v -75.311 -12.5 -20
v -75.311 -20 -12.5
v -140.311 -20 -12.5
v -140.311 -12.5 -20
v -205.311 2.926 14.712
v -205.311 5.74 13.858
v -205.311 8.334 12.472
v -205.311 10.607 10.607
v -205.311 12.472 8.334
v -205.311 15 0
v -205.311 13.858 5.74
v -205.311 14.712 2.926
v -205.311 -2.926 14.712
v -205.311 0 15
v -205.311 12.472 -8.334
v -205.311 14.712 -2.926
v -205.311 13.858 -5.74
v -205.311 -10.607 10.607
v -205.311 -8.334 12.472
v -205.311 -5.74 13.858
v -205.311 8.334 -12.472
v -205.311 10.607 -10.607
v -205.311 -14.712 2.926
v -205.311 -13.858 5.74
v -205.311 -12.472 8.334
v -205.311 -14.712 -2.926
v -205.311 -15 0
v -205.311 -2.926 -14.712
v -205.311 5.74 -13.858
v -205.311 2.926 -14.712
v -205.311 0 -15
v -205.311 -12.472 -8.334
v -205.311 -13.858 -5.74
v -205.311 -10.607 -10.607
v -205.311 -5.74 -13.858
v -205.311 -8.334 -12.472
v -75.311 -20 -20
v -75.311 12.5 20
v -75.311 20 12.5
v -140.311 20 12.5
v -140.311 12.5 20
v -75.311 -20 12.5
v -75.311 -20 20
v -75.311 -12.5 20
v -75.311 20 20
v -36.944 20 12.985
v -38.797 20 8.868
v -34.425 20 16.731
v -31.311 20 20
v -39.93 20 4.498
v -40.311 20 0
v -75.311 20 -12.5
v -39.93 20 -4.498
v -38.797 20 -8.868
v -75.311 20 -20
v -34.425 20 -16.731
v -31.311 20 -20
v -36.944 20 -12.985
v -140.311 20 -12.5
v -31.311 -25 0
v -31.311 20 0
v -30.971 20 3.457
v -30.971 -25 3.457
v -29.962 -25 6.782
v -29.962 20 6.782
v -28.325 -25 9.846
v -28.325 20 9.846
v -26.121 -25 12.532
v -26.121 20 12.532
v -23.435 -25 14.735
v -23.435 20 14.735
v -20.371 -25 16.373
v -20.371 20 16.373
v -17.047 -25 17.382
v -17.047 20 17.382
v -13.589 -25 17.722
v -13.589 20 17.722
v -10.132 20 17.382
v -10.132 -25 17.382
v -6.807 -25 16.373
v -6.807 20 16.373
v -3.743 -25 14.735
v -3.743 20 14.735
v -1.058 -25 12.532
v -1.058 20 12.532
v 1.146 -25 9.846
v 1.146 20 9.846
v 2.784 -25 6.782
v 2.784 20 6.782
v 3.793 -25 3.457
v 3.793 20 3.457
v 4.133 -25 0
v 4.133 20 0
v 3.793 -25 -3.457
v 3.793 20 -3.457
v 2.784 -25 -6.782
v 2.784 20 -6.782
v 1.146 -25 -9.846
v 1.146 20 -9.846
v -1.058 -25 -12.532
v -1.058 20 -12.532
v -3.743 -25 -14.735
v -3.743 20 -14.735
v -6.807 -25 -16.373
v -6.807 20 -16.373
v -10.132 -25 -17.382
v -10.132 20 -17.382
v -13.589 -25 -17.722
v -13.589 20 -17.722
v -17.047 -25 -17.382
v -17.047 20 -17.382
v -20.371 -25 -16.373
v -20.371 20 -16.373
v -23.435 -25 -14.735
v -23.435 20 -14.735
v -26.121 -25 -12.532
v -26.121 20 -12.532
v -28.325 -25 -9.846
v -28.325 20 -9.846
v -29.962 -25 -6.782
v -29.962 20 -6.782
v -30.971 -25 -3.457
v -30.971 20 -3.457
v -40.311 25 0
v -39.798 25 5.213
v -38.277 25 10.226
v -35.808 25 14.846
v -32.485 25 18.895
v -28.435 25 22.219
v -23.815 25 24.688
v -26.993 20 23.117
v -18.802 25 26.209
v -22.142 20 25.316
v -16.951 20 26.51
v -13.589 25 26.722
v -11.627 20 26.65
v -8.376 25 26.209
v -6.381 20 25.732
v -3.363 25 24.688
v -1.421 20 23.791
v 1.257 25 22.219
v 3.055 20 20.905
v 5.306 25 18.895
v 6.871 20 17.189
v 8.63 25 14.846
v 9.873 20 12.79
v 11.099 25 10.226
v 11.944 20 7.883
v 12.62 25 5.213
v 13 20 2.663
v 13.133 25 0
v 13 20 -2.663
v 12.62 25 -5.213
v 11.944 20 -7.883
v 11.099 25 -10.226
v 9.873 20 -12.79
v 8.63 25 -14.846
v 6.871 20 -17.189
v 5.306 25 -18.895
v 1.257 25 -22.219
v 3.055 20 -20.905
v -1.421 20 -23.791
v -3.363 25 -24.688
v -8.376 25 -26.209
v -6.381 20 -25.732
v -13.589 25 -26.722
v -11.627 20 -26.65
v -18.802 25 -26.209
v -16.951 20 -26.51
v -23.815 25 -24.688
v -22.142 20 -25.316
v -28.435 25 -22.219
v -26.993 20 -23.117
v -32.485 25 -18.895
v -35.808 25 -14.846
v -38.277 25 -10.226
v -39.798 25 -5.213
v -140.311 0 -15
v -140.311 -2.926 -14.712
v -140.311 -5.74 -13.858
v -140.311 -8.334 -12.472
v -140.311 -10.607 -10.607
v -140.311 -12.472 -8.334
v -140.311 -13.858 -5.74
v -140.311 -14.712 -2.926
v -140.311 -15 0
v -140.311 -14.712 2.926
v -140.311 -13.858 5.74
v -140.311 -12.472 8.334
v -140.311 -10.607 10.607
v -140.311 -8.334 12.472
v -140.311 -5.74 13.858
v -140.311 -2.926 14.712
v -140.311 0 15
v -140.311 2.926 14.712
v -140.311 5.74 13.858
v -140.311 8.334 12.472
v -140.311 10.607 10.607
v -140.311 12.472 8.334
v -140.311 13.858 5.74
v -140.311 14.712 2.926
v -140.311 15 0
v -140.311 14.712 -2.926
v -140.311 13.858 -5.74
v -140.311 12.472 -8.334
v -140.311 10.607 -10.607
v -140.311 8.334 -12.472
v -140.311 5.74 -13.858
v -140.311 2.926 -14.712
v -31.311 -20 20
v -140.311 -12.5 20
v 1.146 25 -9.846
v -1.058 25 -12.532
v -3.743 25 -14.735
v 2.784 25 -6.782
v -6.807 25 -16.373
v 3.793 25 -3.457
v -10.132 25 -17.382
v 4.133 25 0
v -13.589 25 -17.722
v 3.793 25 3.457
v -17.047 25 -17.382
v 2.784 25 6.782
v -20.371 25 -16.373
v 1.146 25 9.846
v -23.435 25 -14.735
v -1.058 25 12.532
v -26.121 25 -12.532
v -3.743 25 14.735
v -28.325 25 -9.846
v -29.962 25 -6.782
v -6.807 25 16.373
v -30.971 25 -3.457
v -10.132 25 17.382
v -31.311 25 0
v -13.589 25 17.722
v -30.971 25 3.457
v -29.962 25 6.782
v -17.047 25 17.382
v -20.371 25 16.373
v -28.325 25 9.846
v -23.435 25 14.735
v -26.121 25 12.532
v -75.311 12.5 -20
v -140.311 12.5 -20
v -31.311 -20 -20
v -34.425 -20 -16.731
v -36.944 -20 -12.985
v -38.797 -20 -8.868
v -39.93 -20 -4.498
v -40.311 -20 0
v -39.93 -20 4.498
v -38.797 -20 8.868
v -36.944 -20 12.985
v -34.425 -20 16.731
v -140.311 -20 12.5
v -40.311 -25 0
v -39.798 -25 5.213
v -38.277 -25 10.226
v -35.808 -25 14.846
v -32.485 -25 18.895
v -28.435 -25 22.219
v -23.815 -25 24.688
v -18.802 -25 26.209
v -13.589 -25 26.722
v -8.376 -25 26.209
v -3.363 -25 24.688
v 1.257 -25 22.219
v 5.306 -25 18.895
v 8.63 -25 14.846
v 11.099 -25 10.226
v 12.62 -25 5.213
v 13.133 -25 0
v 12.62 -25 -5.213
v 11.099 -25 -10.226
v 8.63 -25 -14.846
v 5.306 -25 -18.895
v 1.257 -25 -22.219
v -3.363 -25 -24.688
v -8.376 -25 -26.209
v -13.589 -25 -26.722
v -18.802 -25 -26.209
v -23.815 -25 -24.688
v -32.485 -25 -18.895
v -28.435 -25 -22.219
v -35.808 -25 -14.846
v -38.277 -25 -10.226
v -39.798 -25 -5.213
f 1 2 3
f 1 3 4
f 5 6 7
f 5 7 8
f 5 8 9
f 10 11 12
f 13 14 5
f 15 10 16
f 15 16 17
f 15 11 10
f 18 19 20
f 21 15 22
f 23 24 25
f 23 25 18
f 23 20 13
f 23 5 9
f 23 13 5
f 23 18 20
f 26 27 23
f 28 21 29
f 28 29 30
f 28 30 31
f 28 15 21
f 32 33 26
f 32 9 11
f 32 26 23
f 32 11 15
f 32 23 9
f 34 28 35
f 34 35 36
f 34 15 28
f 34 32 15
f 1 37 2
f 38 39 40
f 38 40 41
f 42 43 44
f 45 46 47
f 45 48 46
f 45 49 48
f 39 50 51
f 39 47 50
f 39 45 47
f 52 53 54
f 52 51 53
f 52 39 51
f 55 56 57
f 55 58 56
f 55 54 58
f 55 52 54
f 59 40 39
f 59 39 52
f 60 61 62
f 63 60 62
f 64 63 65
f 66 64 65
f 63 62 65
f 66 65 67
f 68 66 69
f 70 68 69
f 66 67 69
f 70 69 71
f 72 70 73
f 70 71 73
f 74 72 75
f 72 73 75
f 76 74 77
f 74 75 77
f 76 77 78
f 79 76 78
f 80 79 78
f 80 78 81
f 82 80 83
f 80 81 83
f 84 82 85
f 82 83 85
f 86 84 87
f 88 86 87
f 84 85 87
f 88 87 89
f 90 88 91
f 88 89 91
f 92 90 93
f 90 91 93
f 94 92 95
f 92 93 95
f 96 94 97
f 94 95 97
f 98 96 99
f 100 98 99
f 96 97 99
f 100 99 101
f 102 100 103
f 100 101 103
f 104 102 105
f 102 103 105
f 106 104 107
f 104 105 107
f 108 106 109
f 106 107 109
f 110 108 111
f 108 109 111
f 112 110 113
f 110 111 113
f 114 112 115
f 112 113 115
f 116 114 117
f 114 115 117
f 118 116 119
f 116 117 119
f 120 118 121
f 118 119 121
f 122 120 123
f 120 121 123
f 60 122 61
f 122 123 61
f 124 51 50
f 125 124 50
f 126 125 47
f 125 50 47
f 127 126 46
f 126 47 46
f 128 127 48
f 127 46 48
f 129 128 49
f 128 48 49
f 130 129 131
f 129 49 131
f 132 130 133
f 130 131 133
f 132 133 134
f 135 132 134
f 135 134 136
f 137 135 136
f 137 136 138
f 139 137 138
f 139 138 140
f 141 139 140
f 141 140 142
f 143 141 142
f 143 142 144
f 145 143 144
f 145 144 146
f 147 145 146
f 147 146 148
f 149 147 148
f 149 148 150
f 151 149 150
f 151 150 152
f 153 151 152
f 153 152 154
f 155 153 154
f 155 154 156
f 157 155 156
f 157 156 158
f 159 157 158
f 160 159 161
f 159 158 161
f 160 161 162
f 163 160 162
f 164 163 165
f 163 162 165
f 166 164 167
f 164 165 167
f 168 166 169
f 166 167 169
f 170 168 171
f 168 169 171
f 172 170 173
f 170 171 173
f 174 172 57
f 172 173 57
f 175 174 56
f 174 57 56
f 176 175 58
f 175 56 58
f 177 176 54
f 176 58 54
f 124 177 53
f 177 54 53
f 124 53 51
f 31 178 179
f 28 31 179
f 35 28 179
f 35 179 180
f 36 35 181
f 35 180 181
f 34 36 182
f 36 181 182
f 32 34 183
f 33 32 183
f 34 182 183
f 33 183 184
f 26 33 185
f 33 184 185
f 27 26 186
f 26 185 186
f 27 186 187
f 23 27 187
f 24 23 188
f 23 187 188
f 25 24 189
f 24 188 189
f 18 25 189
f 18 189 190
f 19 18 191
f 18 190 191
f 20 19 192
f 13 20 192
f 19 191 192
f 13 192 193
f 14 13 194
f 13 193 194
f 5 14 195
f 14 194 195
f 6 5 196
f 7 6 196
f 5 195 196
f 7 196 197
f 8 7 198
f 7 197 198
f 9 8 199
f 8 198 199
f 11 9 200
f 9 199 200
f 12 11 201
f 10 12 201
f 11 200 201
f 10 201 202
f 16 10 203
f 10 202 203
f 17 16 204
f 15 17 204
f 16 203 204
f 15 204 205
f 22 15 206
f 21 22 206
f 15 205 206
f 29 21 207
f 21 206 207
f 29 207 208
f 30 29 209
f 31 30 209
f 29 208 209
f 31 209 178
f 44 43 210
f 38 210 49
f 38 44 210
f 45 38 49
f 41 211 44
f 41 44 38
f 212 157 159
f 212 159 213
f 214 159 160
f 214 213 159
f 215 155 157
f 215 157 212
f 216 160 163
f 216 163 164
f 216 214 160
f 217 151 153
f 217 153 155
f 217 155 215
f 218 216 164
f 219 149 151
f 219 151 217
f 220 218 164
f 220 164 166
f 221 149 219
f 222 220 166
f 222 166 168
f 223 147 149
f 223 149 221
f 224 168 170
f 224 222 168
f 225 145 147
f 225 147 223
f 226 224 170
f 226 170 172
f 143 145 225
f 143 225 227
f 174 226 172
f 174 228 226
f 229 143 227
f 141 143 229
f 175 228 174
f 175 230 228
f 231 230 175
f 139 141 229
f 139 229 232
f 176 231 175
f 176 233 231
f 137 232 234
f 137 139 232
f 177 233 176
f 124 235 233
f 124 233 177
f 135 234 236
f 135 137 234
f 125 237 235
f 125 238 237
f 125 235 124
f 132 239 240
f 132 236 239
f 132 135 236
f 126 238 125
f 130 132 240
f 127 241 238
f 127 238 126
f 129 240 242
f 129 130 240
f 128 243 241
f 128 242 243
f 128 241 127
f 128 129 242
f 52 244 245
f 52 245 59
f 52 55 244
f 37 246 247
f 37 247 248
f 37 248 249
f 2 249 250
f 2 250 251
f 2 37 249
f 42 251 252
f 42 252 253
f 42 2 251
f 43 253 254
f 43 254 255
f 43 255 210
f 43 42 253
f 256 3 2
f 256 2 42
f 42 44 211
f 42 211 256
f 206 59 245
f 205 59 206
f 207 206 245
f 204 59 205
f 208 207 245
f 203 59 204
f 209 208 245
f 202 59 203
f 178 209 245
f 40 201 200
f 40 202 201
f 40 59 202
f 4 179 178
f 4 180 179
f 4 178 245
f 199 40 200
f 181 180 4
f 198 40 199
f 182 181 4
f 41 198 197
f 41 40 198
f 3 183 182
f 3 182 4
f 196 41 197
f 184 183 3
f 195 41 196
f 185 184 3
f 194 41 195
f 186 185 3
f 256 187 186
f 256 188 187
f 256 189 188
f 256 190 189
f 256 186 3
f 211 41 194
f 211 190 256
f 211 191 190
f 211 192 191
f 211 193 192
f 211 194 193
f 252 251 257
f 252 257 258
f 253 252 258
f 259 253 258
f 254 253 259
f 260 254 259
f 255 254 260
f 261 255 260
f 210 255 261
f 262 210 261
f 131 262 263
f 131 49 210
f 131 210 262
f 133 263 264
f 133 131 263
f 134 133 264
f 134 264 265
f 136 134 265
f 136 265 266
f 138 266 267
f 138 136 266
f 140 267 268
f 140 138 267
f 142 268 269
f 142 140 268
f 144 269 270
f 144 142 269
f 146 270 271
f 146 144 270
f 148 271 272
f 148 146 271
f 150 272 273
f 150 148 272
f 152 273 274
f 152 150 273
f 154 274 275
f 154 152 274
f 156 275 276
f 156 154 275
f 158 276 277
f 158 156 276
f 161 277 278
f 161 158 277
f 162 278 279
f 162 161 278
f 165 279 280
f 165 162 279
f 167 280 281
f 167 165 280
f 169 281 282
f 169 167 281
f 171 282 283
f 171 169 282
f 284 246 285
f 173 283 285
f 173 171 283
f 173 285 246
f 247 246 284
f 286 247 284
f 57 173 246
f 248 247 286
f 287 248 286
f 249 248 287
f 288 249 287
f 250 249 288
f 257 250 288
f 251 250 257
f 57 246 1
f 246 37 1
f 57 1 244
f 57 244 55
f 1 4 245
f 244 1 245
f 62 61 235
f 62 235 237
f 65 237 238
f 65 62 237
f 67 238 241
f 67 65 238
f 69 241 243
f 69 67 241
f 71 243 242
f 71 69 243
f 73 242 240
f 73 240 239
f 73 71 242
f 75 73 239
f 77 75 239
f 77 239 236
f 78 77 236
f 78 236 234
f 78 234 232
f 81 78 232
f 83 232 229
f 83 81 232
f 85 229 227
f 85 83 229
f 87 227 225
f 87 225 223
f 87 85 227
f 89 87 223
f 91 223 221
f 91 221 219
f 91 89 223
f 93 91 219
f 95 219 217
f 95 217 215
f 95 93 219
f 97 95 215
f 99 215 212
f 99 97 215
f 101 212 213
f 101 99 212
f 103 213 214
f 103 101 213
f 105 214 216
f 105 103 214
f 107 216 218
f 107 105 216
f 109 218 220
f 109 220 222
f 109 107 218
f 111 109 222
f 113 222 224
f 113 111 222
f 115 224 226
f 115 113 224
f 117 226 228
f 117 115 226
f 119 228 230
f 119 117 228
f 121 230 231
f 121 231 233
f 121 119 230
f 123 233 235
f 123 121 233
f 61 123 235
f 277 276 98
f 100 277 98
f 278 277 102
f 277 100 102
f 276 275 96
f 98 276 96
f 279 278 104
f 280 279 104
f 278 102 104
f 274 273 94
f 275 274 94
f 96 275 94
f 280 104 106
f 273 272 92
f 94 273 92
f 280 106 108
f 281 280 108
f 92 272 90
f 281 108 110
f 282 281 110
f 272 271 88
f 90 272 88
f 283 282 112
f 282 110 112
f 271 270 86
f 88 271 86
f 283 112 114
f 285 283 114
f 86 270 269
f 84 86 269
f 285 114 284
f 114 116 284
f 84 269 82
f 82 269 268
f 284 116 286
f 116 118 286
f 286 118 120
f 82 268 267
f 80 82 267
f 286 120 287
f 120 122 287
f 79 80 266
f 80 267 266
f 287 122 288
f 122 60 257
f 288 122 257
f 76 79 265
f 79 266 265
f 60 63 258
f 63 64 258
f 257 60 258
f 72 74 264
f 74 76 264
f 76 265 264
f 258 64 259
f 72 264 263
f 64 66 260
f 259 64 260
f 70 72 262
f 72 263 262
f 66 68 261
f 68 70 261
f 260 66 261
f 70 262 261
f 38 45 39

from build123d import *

# Parameters (mm, degrees)
BOSS_EXTRUDE1_DEPTH      = 20
SKETCH2_R                = 26.722222222
SKETCH2_R_2              = 17.722222222
BOSS_EXTRUDE2_DEPTH      = 20
CUT_EXTRUDE1_DEPTH       = 65
SKETCH4_R                = 15
BOSS_EXTRUDE3_DEPTH      = 65
CIRPATTERN1_COUNT        = 4
SKETCH5_W                = 98.755733185
SKETCH5_H                = 100
CUT_EXTRUDE2_DEPTH       = 216.315330002
CUT_EXTRUDE2_DEPTH_BACK  = 216.315330002
MOVE_FACE1_BY            = 9
SKETCH6_R                = 26.722222222
SKETCH6_R_2              = 17.722222222
BOSS_EXTRUDE4_DEPTH      = 5
BOSS_EXTRUDE4_DEPTH_BACK = 45


with BuildPart() as part:
    # Sketch1 → Boss-Extrude1 (new, symmetric)
    with BuildSketch(Plane.XY):
        with BuildLine():
            Line((-140.311288741, 0), (-45, 0))
            ThreePointArc((-45, 0), (-43.812144397, 10.271124735), (-40.311288741, 20))
            Line((-40.311288741, 20), (-140.311288741, 20))
            Line((-140.311288741, 20), (-140.311288741, 0))
        make_face()
        with BuildLine():
            ThreePointArc((-40.311288741, -20), (-43.812144397, -10.271124735), (-45, 0))
            Line((-45, 0), (-140.311288741, 0))
            Line((-140.311288741, 0), (-140.311288741, -20))
            Line((-140.311288741, -20), (-40.311288741, -20))
        make_face()
        with BuildLine():
            ThreePointArc((-25, 0), (-17.67766953, 17.67766953), (0, 25))
            Line((0, 25), (9, 25))
            Line((9, 25), (9, 45))
            Line((9, 45), (0, 45))
            ThreePointArc((0, 45), (-23.717082451, 38.242646352), (-40.311288741, 20))
            ThreePointArc((-40.311288741, 20), (-43.812144397, 10.271124735), (-45, 0))
            Line((-45, 0), (-25, 0))
        make_face()
        with BuildLine():
            ThreePointArc((0, -25), (-17.67766953, -17.67766953), (-25, 0))
            Line((-25, 0), (-45, 0))
            ThreePointArc((-45, 0), (-43.812144397, -10.271124735), (-40.311288741, -20))
            ThreePointArc((-40.311288741, -20), (-23.717082451, -38.242646352), (0, -45))
            Line((0, -45), (9, -45))
            Line((9, -45), (9, -25))
            Line((9, -25), (0, -25))
        make_face()
    extrude(amount=BOSS_EXTRUDE1_DEPTH, both=True)

    # Sketch2 → Boss-Extrude2 (add)
    with BuildSketch(Plane(origin=(0, 45, 0), x_dir=(1, 0, 0), z_dir=(0, 1, 0))):
        with Locations((26.722222222, 0)):
            Circle(SKETCH2_R)
        with Locations(Location((26.722222222, 0, 0), (0, 0, 270))):
            Circle(SKETCH2_R_2, mode=Mode.SUBTRACT)
    boss_extrude2 = extrude(amount=-BOSS_EXTRUDE2_DEPTH)

    # Mirror1: Boss-Extrude2 across plane
    add(boss_extrude2.mirror(Plane.ZX))

    # Sketch3 → Cut-Extrude1 (cut)
    with BuildSketch(Plane.ZY.offset(140.311288741)):
        Polygon((-12.5, 20), (-20, 20), (-20, 12.5), align=None)
    cut_extrude1 = extrude(amount=-CUT_EXTRUDE1_DEPTH, mode=Mode.SUBTRACT)

    # Sketch4 → Boss-Extrude3 (add)
    with BuildSketch(Plane.ZY.offset(140.311288741)):
        with Locations(Location((0, 0, 0), (0, 0, 180))):
            Circle(SKETCH4_R)
    extrude(amount=BOSS_EXTRUDE3_DEPTH)

    # CirPattern1: Cut-Extrude1 ×4 about axis
    cirpattern1_axis = Axis((0, 0, 0), (1, 0, 0))
    for i in range(1, CIRPATTERN1_COUNT):
        add(cut_extrude1.rotate(cirpattern1_axis, i * 360 / CIRPATTERN1_COUNT), mode=Mode.SUBTRACT)

    # Sketch5 → Cut-Extrude2 (cut, two sides)
    with BuildSketch(Plane.XY.offset(20)) as cut_extrude2_sk:
        with Locations((9.066577851, 0)):
            Rectangle(SKETCH5_W, SKETCH5_H)
    extrude(amount=CUT_EXTRUDE2_DEPTH, mode=Mode.SUBTRACT)
    extrude(cut_extrude2_sk.sketch, amount=-CUT_EXTRUDE2_DEPTH_BACK, mode=Mode.SUBTRACT)

    # Move Face1: a face moved outward by 9.0
    extrude(part.faces().sort_by_distance((-40.311288741, 0, 0))[0], amount=MOVE_FACE1_BY, dir=(1, 0, 0))

    # Sketch6 → Boss-Extrude4 (add, two sides)
    with BuildSketch(Plane(origin=(0, 20, 0), x_dir=(1, 0, 0), z_dir=(0, 1, 0))) as boss_extrude4_sk:
        with Locations(Location((-13.589066519, 0, 0), (0, 0, 180))):
            Circle(SKETCH6_R)
        with Locations(Location((-13.589066519, 0, 0), (0, 0, 180))):
            Circle(SKETCH6_R_2, mode=Mode.SUBTRACT)
    extrude(amount=BOSS_EXTRUDE4_DEPTH)
    extrude(boss_extrude4_sk.sketch, amount=-BOSS_EXTRUDE4_DEPTH_BACK)


solid = part.part
